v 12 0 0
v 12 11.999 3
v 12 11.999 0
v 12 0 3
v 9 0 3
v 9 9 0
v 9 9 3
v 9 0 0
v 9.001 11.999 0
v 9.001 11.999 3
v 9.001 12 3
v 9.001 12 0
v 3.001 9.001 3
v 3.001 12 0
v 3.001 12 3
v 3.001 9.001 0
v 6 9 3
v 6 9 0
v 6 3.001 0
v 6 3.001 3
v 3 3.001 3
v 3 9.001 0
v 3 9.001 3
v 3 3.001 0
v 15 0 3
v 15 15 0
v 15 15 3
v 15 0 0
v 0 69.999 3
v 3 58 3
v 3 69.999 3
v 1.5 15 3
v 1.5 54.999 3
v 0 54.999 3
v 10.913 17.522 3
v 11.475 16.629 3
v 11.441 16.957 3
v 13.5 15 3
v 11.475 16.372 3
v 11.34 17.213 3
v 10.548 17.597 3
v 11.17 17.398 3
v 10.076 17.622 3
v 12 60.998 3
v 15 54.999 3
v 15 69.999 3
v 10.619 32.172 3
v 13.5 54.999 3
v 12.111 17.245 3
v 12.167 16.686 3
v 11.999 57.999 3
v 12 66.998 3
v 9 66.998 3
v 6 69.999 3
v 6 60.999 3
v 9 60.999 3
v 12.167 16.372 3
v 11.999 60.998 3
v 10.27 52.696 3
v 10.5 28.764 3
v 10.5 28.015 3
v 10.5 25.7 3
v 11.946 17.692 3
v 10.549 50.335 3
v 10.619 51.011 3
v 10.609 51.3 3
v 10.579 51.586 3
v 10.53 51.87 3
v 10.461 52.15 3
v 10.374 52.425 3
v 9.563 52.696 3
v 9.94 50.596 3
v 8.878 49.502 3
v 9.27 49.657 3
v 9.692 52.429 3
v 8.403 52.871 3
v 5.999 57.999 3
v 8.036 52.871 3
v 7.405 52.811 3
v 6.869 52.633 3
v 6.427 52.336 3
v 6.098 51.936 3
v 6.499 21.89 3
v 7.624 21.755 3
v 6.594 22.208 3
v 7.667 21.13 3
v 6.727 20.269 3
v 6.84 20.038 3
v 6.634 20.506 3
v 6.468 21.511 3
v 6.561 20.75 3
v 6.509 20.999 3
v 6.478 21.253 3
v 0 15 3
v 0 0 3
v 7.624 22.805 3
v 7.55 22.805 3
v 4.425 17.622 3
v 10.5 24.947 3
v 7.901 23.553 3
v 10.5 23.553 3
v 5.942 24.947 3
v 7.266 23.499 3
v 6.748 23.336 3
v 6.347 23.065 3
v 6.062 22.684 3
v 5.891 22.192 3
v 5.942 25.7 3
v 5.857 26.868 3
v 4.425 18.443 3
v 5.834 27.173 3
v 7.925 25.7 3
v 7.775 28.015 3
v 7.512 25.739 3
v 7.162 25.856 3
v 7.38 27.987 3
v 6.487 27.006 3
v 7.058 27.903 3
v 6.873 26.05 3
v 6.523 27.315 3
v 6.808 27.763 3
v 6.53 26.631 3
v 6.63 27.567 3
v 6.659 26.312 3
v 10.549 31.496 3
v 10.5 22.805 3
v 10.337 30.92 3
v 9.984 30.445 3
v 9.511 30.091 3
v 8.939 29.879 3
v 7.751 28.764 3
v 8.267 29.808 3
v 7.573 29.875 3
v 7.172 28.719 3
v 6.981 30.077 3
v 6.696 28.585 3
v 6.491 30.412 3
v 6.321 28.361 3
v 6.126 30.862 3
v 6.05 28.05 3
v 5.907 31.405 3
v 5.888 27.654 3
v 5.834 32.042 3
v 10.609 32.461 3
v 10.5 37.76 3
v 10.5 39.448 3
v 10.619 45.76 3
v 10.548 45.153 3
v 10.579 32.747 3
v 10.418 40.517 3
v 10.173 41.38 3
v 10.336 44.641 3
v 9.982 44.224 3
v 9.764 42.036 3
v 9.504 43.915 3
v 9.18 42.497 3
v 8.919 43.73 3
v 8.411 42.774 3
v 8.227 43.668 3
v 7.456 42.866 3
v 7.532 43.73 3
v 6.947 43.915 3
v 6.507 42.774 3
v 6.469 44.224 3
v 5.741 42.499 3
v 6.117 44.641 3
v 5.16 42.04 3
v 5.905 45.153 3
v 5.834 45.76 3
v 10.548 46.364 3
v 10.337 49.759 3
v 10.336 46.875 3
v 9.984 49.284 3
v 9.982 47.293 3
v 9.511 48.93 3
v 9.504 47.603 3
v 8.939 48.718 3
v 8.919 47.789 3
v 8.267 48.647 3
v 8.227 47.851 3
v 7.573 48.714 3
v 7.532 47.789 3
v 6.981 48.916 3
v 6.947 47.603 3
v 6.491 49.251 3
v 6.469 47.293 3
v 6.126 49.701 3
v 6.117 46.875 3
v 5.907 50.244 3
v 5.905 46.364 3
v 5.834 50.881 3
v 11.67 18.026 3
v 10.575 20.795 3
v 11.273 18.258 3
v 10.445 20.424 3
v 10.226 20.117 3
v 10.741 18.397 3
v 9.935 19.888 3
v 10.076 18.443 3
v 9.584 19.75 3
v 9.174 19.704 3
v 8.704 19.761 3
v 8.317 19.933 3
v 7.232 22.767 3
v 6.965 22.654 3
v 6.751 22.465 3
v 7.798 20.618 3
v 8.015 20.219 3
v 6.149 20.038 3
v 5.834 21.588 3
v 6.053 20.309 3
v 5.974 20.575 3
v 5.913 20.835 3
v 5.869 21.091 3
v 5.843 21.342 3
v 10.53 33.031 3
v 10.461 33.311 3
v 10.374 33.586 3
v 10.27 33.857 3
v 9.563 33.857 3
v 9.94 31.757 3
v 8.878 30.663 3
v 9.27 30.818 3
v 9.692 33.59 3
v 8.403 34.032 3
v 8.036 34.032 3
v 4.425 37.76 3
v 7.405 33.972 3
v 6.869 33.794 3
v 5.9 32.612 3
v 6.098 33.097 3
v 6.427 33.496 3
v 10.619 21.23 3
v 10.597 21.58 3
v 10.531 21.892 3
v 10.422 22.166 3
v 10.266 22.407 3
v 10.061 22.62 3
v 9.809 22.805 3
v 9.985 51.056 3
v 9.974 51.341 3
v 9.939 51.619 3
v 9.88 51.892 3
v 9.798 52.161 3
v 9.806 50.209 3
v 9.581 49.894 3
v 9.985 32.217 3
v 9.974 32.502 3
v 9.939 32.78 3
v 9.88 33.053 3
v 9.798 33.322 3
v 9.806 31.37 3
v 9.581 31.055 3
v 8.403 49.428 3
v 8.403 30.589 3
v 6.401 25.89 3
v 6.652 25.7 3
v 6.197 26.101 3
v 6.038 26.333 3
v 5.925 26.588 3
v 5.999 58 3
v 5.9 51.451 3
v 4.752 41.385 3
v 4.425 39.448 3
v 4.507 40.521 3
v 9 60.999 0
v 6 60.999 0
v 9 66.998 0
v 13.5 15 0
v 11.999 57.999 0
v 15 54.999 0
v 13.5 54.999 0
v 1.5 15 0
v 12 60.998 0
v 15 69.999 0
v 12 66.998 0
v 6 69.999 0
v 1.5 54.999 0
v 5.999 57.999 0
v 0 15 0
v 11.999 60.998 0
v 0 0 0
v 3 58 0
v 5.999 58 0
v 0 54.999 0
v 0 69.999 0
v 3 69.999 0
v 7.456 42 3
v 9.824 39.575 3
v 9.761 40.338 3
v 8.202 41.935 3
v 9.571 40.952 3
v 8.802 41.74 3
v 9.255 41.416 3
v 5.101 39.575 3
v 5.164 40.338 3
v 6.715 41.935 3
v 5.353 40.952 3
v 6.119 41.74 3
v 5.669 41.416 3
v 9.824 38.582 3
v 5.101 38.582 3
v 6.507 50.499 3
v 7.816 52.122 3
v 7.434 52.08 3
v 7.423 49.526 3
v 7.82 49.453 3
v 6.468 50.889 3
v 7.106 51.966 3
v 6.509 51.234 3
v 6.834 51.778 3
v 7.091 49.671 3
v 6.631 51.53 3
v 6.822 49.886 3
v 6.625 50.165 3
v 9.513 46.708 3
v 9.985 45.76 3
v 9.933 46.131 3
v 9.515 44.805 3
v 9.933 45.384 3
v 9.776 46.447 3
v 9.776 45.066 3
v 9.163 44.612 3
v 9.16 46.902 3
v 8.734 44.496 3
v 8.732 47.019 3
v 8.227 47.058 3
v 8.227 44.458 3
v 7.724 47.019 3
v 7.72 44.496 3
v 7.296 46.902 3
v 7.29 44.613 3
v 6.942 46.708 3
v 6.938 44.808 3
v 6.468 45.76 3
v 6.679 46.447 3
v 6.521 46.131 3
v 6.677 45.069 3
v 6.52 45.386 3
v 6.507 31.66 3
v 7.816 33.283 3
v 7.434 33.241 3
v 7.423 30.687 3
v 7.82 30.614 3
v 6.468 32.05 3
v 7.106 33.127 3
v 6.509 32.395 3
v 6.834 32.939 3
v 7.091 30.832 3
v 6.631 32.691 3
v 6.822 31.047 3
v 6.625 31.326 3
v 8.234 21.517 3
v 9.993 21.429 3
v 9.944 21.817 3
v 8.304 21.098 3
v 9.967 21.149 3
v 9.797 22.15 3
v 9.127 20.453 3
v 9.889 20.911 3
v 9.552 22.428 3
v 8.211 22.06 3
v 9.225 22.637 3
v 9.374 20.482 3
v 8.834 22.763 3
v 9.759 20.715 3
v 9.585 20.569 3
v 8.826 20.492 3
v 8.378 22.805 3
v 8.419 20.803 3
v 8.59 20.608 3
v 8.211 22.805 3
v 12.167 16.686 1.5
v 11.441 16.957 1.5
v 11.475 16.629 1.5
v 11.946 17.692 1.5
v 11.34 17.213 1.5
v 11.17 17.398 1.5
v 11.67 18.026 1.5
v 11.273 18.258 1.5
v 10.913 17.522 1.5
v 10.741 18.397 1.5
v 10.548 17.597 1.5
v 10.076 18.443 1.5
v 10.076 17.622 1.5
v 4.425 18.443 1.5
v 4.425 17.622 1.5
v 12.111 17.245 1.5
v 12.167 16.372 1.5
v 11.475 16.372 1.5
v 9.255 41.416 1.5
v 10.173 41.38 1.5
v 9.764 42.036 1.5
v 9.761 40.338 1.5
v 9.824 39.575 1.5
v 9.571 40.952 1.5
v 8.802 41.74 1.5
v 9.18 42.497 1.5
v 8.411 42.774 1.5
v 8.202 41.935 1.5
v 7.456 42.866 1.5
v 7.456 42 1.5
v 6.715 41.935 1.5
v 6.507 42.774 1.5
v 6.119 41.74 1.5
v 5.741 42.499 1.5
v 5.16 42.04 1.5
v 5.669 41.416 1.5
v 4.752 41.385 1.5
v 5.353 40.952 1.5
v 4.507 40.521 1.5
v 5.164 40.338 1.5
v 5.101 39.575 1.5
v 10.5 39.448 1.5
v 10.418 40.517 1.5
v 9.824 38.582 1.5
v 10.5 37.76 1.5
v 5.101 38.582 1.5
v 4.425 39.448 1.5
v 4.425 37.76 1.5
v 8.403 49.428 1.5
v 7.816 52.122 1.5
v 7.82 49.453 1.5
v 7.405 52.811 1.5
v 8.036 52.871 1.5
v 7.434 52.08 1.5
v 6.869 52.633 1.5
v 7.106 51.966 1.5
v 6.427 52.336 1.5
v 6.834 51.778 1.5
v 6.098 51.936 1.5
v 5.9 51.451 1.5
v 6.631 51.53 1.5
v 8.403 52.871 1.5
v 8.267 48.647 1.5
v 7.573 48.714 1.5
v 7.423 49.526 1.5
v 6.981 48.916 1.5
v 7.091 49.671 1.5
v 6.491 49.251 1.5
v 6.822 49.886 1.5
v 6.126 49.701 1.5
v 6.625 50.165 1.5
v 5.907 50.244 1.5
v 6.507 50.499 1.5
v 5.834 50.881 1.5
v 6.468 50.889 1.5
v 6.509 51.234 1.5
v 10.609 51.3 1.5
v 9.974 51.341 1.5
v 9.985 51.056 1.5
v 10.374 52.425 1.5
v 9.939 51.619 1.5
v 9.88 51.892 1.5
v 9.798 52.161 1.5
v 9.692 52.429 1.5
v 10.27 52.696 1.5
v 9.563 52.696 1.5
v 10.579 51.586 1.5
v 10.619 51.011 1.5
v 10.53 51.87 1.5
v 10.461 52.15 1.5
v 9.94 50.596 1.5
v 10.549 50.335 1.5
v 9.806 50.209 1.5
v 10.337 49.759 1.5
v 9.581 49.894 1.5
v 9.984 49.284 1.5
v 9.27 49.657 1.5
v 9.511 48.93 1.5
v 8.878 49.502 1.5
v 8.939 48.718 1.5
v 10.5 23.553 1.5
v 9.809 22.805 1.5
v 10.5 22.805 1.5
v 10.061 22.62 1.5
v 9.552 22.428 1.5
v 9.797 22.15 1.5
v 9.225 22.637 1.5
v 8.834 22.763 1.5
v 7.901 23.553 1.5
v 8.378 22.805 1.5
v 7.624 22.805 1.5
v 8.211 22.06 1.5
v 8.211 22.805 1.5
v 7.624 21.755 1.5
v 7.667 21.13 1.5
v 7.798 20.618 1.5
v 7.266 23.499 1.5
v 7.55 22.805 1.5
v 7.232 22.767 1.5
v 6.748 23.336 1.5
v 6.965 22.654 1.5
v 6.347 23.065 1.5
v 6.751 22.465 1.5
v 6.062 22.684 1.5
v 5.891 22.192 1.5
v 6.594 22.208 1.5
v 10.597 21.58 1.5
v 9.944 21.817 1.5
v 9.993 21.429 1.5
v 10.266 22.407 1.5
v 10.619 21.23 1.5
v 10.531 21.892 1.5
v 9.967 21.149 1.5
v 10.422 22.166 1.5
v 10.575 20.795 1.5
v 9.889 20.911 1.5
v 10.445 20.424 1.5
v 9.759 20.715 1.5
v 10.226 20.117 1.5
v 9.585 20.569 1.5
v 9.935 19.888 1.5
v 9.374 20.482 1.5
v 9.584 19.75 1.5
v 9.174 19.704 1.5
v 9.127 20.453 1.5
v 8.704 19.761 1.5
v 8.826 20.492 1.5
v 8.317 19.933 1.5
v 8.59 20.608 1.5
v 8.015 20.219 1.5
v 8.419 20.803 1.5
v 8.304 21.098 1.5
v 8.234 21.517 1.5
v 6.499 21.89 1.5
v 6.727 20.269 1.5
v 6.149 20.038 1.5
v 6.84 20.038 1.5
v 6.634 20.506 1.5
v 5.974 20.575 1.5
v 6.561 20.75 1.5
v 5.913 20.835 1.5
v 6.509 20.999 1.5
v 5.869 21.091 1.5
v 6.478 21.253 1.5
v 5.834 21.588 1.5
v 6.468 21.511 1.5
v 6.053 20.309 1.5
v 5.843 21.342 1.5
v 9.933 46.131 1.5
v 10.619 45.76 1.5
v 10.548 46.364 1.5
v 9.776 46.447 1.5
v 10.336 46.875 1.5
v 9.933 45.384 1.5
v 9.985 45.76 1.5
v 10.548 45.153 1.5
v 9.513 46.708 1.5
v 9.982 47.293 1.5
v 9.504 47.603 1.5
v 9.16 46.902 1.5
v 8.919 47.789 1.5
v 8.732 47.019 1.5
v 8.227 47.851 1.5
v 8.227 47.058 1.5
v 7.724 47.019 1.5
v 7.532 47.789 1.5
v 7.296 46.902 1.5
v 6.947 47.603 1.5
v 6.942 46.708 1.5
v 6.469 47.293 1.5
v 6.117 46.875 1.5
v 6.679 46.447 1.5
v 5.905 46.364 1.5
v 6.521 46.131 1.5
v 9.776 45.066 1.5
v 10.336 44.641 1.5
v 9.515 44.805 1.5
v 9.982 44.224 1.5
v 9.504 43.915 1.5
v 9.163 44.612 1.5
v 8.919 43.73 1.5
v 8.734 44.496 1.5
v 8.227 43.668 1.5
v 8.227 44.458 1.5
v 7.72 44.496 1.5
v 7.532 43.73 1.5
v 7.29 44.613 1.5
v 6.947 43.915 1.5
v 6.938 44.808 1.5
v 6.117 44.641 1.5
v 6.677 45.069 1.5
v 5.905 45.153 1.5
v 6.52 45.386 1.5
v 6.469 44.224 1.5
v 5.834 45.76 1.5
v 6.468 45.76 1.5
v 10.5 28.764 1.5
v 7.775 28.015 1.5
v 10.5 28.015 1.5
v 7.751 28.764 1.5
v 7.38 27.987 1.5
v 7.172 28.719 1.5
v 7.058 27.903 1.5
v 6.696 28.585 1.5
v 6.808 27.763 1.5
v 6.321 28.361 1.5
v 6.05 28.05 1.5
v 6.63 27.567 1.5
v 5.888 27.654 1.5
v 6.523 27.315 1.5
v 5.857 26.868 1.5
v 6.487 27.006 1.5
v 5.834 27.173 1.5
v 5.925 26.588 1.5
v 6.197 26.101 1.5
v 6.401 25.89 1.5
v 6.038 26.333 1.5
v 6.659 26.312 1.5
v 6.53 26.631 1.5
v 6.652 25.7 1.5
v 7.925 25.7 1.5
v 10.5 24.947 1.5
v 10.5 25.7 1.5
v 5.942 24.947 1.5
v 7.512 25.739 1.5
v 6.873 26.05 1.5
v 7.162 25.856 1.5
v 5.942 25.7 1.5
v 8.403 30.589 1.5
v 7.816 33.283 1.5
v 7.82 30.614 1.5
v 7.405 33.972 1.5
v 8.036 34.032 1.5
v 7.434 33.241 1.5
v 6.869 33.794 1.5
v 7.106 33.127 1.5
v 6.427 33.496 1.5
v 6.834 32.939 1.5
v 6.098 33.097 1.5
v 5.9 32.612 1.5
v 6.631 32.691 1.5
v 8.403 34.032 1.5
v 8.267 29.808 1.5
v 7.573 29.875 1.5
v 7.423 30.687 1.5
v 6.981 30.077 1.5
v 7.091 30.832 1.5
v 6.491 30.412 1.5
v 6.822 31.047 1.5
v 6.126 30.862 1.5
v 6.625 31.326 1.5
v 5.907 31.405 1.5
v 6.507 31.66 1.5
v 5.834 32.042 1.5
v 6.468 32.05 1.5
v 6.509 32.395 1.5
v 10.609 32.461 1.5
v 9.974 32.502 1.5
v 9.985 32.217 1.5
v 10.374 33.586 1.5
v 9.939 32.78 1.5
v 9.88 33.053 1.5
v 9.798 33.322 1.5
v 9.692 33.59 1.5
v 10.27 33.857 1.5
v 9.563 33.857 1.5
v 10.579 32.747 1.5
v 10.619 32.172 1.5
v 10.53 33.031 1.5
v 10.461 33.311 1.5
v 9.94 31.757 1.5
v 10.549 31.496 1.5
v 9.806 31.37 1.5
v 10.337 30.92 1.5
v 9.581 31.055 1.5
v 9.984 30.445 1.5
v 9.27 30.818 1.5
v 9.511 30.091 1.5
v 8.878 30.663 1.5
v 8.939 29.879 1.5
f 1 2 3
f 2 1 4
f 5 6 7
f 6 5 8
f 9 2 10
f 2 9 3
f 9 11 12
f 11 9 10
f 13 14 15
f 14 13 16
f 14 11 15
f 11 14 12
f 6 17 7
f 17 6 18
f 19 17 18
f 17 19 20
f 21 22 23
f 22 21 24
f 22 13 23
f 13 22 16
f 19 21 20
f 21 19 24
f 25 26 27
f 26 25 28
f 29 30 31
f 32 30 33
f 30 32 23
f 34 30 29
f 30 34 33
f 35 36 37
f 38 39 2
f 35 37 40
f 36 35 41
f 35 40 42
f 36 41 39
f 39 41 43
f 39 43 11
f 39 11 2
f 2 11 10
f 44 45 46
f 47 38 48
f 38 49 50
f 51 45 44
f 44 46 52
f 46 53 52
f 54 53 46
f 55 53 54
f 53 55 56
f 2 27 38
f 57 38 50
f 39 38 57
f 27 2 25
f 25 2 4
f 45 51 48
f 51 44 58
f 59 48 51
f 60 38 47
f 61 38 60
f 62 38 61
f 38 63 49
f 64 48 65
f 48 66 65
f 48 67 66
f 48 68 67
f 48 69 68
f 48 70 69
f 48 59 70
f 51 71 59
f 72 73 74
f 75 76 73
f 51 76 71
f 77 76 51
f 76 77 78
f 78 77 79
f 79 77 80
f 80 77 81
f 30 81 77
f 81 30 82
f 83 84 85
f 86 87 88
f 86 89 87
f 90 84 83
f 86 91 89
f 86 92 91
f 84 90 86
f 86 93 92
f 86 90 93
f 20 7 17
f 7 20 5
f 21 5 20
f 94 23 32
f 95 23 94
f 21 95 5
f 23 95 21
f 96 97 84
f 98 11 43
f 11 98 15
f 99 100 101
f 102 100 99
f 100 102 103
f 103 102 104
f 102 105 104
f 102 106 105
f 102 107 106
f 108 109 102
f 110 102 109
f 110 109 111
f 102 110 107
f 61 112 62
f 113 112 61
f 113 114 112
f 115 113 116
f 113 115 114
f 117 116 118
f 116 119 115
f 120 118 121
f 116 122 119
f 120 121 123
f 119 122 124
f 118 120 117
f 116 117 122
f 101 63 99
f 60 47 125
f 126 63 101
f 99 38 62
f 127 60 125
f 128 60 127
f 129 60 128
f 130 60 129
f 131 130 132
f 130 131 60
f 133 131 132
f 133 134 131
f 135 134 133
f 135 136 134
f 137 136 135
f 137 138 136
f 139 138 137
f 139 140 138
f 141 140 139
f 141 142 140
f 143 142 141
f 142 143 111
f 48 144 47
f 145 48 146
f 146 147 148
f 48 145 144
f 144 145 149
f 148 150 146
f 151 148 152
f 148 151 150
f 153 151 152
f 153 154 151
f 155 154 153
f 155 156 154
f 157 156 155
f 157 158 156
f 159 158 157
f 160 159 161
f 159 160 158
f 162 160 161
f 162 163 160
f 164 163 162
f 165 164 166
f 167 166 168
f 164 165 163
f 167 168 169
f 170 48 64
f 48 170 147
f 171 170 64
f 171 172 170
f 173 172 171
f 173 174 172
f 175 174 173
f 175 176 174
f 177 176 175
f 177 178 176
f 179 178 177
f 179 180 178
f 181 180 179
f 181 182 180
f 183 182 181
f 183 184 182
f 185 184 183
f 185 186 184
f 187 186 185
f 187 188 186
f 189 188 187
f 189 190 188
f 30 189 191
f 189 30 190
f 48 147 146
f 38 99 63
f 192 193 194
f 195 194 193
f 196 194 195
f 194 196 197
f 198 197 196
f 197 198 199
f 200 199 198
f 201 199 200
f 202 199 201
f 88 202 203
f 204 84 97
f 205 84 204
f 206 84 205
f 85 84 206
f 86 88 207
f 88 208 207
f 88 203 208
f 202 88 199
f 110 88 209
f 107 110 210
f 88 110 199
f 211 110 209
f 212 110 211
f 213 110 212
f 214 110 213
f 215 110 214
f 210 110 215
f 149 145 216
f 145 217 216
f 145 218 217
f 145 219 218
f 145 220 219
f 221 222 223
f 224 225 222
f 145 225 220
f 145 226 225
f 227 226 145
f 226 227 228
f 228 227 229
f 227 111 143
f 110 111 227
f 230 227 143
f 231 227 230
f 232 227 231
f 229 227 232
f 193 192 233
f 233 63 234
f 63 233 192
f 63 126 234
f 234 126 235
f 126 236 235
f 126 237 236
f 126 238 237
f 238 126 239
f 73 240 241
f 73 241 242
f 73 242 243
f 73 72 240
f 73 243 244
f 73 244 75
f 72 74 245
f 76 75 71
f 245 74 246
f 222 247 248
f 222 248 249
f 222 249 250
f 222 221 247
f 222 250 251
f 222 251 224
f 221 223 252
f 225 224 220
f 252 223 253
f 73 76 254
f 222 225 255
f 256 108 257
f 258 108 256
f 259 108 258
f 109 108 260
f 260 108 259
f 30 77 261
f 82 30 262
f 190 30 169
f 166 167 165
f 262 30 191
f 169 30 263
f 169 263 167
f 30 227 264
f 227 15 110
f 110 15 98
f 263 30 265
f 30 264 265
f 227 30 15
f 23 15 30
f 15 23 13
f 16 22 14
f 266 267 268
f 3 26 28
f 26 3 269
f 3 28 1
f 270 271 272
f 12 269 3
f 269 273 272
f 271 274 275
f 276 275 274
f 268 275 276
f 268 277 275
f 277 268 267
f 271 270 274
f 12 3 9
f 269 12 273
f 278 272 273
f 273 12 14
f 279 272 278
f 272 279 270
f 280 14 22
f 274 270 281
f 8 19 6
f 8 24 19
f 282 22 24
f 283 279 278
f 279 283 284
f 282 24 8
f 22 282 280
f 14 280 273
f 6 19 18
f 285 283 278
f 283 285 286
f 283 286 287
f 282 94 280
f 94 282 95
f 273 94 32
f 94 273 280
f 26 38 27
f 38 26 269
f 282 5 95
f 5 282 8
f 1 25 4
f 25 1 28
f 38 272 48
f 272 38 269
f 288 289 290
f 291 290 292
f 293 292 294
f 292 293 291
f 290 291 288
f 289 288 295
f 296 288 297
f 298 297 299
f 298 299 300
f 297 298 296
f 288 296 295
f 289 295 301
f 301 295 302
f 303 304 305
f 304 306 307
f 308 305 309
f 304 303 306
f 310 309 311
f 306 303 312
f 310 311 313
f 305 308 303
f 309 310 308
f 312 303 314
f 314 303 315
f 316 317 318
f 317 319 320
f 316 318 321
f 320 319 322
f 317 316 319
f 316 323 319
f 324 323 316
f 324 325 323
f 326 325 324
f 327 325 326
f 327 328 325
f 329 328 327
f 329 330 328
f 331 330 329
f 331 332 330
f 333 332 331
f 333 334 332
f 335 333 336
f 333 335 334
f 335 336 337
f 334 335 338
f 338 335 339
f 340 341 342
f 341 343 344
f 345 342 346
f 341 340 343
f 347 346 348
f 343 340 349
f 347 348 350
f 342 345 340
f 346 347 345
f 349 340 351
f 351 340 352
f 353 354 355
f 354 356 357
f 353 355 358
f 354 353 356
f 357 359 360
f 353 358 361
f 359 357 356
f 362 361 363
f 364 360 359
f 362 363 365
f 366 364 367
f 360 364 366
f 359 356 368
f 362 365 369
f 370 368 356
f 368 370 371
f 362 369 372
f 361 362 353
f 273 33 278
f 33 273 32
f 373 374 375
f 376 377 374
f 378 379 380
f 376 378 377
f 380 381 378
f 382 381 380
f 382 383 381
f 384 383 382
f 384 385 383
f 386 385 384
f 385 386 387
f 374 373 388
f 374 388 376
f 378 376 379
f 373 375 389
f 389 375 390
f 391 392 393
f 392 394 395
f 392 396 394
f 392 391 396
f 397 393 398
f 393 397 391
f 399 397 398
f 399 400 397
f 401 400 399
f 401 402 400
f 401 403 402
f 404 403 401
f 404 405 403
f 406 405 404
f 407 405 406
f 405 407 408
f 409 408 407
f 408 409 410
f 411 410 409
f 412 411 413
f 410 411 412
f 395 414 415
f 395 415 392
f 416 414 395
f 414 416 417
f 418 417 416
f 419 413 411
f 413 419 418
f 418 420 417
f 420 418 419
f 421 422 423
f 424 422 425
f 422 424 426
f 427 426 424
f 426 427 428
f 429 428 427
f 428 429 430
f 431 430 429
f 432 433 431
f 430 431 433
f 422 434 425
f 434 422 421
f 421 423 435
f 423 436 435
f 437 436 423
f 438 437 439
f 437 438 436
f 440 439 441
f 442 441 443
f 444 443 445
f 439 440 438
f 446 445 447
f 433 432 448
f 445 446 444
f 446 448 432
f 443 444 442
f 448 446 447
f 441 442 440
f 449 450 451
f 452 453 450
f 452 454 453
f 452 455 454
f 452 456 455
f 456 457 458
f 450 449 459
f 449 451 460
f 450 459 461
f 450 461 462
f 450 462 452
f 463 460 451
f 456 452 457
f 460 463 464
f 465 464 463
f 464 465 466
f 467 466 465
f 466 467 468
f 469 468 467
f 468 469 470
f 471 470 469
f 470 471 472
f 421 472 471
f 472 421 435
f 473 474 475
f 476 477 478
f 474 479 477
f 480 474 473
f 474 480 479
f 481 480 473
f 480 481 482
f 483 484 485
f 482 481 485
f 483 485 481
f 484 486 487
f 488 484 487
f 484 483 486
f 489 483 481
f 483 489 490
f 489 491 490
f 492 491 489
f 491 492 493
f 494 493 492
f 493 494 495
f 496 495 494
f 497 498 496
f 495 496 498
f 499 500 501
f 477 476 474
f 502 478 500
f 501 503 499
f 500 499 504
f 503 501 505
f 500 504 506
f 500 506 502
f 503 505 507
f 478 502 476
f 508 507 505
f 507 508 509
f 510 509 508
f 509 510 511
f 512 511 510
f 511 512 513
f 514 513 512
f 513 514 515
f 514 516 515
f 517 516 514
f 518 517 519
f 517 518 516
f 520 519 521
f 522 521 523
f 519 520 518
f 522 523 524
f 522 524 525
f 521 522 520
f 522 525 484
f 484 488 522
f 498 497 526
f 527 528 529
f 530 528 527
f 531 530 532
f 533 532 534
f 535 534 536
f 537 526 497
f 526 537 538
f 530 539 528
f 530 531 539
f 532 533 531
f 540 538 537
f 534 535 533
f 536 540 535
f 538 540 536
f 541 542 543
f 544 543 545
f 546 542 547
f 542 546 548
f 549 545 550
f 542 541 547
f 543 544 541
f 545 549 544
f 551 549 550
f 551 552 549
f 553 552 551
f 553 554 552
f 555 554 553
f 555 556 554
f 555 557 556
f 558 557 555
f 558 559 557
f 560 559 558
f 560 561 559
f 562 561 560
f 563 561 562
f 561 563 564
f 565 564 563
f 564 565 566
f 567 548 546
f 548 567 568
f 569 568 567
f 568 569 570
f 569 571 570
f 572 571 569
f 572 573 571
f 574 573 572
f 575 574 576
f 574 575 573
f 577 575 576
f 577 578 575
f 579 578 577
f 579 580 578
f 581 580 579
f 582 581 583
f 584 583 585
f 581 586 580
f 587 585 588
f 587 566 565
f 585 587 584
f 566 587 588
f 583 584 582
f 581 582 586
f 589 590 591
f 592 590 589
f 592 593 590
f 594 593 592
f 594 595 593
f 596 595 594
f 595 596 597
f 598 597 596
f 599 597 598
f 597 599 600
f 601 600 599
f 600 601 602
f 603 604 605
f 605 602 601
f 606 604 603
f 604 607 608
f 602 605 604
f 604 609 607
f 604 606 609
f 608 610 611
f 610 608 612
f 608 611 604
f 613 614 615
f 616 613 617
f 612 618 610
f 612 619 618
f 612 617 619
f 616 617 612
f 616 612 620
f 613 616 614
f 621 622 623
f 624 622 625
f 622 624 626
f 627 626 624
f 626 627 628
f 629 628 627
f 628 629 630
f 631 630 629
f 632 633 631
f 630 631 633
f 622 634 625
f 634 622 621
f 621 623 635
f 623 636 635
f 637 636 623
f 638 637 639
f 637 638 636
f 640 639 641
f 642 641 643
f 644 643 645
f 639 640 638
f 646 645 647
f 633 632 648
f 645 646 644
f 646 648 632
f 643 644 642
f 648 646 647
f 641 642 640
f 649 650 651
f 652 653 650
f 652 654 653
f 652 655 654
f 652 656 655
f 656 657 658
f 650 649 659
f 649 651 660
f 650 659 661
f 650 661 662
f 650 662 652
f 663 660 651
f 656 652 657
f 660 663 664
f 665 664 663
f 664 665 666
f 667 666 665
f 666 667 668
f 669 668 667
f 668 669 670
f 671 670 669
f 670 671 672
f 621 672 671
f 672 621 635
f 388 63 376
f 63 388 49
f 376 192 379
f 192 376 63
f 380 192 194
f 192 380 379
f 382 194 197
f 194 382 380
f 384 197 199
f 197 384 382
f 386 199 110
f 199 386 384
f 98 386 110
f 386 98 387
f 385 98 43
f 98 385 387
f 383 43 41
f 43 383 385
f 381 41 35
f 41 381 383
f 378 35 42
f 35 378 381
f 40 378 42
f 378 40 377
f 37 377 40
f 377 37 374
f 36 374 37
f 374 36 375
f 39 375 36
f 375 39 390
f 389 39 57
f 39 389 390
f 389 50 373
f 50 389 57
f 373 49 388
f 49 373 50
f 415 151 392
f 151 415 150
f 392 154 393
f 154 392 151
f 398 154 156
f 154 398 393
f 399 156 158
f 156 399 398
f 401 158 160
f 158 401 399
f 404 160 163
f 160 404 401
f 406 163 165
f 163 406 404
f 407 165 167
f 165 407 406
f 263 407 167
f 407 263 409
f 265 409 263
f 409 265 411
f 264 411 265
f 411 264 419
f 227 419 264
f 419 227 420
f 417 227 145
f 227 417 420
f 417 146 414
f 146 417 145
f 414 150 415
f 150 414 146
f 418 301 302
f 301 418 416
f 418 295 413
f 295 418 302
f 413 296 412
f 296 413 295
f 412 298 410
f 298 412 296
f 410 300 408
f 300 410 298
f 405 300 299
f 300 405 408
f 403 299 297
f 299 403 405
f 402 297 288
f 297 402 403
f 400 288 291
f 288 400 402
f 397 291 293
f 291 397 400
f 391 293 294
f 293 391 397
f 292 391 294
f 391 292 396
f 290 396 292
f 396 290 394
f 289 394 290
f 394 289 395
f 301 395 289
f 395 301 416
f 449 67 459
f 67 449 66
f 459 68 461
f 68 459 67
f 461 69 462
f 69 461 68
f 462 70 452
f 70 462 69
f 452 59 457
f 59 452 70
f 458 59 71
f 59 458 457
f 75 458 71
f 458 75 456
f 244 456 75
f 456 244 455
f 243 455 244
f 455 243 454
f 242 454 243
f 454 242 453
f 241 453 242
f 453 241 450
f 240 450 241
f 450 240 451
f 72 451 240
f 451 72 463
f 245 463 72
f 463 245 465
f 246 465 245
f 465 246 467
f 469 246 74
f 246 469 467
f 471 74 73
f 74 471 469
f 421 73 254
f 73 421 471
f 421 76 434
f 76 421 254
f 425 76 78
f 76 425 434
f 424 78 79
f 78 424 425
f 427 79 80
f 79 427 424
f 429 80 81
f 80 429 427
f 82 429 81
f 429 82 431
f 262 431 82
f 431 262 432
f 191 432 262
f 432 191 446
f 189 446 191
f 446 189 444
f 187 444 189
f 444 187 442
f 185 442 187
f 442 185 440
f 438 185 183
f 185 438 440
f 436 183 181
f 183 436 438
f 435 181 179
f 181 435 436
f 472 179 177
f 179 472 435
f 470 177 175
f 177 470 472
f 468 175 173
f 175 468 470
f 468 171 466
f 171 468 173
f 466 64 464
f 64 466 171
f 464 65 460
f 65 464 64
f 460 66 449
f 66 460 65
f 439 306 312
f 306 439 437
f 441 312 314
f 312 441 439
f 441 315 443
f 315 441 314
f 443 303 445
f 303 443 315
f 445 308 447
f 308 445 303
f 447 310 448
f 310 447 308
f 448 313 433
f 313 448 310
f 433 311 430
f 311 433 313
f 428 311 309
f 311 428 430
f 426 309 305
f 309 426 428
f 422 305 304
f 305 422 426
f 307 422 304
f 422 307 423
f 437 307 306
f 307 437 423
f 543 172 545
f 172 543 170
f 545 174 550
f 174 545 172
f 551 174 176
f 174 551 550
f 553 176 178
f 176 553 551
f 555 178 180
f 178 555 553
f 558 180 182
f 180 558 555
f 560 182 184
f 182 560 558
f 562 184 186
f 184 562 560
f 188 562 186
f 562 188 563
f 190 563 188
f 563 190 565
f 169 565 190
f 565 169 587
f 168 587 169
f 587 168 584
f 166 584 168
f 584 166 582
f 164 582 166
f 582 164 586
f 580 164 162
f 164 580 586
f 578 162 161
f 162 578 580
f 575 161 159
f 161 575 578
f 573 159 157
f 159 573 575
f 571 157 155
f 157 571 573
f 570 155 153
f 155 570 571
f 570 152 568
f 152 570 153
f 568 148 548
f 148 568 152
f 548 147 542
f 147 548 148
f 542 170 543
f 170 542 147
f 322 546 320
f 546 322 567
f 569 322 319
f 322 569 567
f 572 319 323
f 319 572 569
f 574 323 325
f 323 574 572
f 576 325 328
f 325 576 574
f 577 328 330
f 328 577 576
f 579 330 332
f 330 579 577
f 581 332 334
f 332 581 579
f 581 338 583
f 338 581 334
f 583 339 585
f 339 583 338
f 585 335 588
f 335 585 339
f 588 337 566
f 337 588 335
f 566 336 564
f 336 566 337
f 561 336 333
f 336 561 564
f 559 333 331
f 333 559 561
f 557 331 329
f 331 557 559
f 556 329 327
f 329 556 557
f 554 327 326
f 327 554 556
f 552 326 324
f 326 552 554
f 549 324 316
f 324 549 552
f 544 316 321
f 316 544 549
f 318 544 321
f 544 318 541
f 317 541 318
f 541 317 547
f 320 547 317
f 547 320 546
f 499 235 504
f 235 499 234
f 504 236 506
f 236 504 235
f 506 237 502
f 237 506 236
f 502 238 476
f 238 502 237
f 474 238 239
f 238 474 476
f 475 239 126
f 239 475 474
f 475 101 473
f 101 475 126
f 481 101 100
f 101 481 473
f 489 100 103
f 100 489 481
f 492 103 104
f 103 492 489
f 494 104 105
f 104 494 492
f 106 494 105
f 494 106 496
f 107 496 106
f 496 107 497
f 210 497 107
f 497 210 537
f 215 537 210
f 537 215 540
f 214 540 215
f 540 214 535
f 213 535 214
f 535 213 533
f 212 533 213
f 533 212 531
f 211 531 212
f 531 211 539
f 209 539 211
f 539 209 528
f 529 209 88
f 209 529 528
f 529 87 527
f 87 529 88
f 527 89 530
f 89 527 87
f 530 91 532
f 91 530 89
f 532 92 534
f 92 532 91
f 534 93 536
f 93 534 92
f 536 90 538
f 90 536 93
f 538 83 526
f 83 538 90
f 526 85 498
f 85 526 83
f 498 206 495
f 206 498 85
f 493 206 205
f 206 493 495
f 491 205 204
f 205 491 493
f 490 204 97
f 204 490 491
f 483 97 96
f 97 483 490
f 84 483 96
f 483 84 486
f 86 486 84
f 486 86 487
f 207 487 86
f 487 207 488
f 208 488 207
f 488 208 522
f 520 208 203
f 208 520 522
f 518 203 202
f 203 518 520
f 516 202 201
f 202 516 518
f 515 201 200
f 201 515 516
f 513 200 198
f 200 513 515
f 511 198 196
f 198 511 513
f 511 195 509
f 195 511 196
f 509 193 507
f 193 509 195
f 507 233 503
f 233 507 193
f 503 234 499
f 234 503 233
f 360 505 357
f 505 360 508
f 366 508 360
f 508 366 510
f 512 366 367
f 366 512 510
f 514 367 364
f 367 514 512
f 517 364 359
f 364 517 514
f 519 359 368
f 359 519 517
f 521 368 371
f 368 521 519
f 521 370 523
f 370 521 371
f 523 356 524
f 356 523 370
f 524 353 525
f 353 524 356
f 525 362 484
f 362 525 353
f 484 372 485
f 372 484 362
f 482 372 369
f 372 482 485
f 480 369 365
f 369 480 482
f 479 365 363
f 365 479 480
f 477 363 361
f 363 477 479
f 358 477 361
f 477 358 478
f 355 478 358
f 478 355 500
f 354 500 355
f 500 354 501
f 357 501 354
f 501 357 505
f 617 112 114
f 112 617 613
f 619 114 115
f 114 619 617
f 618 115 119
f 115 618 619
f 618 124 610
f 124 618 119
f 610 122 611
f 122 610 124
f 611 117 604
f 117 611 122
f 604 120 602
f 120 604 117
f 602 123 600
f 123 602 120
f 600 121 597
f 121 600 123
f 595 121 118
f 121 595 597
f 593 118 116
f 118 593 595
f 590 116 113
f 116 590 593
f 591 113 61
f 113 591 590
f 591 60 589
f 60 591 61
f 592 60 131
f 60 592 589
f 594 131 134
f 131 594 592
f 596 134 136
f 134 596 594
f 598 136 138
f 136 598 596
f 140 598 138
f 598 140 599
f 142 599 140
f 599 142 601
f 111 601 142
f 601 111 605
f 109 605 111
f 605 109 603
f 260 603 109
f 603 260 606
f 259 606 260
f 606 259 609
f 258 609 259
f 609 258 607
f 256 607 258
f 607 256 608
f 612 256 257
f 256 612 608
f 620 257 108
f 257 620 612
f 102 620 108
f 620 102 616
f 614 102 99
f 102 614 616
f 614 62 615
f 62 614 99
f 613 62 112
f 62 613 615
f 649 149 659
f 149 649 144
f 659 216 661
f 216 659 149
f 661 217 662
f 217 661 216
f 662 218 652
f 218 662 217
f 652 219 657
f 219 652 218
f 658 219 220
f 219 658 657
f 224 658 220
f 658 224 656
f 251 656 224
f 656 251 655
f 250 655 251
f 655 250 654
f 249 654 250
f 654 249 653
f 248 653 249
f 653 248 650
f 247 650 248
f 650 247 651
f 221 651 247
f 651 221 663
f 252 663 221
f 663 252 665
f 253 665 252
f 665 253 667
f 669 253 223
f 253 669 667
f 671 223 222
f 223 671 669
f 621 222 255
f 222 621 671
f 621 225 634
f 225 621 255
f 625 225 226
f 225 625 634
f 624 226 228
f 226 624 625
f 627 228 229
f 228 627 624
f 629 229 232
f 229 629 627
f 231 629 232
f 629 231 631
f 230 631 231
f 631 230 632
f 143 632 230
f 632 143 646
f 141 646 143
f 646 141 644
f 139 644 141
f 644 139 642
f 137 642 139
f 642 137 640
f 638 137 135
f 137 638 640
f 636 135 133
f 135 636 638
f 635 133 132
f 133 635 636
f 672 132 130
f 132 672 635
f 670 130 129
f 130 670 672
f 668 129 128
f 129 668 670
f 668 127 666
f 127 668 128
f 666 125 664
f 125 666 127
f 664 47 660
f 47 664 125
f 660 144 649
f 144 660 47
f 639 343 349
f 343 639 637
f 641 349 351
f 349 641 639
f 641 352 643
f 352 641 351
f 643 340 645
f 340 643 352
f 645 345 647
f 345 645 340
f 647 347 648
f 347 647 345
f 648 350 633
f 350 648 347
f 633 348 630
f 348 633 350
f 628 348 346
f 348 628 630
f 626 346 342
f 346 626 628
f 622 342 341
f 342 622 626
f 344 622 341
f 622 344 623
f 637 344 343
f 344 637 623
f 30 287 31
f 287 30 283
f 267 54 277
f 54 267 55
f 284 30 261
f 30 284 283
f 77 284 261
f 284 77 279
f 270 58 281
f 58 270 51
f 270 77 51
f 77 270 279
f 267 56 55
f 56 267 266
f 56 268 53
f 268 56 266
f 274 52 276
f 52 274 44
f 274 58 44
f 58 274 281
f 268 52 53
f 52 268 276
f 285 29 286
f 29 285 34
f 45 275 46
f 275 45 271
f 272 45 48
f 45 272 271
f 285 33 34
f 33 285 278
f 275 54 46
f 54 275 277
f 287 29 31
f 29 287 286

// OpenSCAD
// Parametric Cord Wrap
// by Ming-Dao Chia

// *Settings*

// How long the center should be
// Depends on how much cord you have, usually
// Does not include ends
cord_wrap_length = 40; // in mm

// Cable diameter
// Make it a bit bigger than the actual cable to ensure that it'll fit well
cord_diameter = 3; // in mm

// Thickness
// (of entire piece)
PCW_thickness = 3; // in mm

// Middle text
// Leave blank for no text
name="Jane Doe";

// Middle text font
font="Open Sans";

// **Advanced settings**

// Overlap factor
// Ensures all objects are connected and holes are hollow
overlap=0.001; // in mm

module PCW_endcap(){
    difference(){
        cube([cord_diameter*5,cord_diameter*5,PCW_thickness]);
        union(){ // this makes a small spiral :)
            translate([cord_diameter*3,-overlap,-overlap])
            cube([cord_diameter,cord_diameter*4,PCW_thickness+(overlap*2)]);
            translate([cord_diameter+overlap,cord_diameter*3,-overlap])
            cube([cord_diameter*2,cord_diameter,PCW_thickness+(overlap*2)]);
            translate([cord_diameter,cord_diameter+overlap,-overlap])
            cube([cord_diameter,cord_diameter*2,PCW_thickness+(overlap*2)]);
        }
    }
}

module PCW_middle(){
    difference(){
        translate([cord_diameter/2,0,0])
    cube([cord_diameter*4,cord_wrap_length,PCW_thickness]);
    rotate([0,0,90])
    translate([cord_wrap_length/2,-cord_diameter*3.5,PCW_thickness/2])
        linear_extrude(height=(PCW_thickness/2)+overlap){
    text(name, font = font,halign="center", size = cord_diameter*2);
        }
    }
}

module PCW_whole(){
    union(){
        PCW_endcap();
        translate([0,cord_diameter*5-overlap,0])
        PCW_middle();
        mirror([0,1,0])
        mirror([1,0,0])
        translate([-cord_diameter*5,-((cord_diameter*10)+cord_wrap_length-overlap),0])
        PCW_endcap();
    }
}

PCW_whole();
